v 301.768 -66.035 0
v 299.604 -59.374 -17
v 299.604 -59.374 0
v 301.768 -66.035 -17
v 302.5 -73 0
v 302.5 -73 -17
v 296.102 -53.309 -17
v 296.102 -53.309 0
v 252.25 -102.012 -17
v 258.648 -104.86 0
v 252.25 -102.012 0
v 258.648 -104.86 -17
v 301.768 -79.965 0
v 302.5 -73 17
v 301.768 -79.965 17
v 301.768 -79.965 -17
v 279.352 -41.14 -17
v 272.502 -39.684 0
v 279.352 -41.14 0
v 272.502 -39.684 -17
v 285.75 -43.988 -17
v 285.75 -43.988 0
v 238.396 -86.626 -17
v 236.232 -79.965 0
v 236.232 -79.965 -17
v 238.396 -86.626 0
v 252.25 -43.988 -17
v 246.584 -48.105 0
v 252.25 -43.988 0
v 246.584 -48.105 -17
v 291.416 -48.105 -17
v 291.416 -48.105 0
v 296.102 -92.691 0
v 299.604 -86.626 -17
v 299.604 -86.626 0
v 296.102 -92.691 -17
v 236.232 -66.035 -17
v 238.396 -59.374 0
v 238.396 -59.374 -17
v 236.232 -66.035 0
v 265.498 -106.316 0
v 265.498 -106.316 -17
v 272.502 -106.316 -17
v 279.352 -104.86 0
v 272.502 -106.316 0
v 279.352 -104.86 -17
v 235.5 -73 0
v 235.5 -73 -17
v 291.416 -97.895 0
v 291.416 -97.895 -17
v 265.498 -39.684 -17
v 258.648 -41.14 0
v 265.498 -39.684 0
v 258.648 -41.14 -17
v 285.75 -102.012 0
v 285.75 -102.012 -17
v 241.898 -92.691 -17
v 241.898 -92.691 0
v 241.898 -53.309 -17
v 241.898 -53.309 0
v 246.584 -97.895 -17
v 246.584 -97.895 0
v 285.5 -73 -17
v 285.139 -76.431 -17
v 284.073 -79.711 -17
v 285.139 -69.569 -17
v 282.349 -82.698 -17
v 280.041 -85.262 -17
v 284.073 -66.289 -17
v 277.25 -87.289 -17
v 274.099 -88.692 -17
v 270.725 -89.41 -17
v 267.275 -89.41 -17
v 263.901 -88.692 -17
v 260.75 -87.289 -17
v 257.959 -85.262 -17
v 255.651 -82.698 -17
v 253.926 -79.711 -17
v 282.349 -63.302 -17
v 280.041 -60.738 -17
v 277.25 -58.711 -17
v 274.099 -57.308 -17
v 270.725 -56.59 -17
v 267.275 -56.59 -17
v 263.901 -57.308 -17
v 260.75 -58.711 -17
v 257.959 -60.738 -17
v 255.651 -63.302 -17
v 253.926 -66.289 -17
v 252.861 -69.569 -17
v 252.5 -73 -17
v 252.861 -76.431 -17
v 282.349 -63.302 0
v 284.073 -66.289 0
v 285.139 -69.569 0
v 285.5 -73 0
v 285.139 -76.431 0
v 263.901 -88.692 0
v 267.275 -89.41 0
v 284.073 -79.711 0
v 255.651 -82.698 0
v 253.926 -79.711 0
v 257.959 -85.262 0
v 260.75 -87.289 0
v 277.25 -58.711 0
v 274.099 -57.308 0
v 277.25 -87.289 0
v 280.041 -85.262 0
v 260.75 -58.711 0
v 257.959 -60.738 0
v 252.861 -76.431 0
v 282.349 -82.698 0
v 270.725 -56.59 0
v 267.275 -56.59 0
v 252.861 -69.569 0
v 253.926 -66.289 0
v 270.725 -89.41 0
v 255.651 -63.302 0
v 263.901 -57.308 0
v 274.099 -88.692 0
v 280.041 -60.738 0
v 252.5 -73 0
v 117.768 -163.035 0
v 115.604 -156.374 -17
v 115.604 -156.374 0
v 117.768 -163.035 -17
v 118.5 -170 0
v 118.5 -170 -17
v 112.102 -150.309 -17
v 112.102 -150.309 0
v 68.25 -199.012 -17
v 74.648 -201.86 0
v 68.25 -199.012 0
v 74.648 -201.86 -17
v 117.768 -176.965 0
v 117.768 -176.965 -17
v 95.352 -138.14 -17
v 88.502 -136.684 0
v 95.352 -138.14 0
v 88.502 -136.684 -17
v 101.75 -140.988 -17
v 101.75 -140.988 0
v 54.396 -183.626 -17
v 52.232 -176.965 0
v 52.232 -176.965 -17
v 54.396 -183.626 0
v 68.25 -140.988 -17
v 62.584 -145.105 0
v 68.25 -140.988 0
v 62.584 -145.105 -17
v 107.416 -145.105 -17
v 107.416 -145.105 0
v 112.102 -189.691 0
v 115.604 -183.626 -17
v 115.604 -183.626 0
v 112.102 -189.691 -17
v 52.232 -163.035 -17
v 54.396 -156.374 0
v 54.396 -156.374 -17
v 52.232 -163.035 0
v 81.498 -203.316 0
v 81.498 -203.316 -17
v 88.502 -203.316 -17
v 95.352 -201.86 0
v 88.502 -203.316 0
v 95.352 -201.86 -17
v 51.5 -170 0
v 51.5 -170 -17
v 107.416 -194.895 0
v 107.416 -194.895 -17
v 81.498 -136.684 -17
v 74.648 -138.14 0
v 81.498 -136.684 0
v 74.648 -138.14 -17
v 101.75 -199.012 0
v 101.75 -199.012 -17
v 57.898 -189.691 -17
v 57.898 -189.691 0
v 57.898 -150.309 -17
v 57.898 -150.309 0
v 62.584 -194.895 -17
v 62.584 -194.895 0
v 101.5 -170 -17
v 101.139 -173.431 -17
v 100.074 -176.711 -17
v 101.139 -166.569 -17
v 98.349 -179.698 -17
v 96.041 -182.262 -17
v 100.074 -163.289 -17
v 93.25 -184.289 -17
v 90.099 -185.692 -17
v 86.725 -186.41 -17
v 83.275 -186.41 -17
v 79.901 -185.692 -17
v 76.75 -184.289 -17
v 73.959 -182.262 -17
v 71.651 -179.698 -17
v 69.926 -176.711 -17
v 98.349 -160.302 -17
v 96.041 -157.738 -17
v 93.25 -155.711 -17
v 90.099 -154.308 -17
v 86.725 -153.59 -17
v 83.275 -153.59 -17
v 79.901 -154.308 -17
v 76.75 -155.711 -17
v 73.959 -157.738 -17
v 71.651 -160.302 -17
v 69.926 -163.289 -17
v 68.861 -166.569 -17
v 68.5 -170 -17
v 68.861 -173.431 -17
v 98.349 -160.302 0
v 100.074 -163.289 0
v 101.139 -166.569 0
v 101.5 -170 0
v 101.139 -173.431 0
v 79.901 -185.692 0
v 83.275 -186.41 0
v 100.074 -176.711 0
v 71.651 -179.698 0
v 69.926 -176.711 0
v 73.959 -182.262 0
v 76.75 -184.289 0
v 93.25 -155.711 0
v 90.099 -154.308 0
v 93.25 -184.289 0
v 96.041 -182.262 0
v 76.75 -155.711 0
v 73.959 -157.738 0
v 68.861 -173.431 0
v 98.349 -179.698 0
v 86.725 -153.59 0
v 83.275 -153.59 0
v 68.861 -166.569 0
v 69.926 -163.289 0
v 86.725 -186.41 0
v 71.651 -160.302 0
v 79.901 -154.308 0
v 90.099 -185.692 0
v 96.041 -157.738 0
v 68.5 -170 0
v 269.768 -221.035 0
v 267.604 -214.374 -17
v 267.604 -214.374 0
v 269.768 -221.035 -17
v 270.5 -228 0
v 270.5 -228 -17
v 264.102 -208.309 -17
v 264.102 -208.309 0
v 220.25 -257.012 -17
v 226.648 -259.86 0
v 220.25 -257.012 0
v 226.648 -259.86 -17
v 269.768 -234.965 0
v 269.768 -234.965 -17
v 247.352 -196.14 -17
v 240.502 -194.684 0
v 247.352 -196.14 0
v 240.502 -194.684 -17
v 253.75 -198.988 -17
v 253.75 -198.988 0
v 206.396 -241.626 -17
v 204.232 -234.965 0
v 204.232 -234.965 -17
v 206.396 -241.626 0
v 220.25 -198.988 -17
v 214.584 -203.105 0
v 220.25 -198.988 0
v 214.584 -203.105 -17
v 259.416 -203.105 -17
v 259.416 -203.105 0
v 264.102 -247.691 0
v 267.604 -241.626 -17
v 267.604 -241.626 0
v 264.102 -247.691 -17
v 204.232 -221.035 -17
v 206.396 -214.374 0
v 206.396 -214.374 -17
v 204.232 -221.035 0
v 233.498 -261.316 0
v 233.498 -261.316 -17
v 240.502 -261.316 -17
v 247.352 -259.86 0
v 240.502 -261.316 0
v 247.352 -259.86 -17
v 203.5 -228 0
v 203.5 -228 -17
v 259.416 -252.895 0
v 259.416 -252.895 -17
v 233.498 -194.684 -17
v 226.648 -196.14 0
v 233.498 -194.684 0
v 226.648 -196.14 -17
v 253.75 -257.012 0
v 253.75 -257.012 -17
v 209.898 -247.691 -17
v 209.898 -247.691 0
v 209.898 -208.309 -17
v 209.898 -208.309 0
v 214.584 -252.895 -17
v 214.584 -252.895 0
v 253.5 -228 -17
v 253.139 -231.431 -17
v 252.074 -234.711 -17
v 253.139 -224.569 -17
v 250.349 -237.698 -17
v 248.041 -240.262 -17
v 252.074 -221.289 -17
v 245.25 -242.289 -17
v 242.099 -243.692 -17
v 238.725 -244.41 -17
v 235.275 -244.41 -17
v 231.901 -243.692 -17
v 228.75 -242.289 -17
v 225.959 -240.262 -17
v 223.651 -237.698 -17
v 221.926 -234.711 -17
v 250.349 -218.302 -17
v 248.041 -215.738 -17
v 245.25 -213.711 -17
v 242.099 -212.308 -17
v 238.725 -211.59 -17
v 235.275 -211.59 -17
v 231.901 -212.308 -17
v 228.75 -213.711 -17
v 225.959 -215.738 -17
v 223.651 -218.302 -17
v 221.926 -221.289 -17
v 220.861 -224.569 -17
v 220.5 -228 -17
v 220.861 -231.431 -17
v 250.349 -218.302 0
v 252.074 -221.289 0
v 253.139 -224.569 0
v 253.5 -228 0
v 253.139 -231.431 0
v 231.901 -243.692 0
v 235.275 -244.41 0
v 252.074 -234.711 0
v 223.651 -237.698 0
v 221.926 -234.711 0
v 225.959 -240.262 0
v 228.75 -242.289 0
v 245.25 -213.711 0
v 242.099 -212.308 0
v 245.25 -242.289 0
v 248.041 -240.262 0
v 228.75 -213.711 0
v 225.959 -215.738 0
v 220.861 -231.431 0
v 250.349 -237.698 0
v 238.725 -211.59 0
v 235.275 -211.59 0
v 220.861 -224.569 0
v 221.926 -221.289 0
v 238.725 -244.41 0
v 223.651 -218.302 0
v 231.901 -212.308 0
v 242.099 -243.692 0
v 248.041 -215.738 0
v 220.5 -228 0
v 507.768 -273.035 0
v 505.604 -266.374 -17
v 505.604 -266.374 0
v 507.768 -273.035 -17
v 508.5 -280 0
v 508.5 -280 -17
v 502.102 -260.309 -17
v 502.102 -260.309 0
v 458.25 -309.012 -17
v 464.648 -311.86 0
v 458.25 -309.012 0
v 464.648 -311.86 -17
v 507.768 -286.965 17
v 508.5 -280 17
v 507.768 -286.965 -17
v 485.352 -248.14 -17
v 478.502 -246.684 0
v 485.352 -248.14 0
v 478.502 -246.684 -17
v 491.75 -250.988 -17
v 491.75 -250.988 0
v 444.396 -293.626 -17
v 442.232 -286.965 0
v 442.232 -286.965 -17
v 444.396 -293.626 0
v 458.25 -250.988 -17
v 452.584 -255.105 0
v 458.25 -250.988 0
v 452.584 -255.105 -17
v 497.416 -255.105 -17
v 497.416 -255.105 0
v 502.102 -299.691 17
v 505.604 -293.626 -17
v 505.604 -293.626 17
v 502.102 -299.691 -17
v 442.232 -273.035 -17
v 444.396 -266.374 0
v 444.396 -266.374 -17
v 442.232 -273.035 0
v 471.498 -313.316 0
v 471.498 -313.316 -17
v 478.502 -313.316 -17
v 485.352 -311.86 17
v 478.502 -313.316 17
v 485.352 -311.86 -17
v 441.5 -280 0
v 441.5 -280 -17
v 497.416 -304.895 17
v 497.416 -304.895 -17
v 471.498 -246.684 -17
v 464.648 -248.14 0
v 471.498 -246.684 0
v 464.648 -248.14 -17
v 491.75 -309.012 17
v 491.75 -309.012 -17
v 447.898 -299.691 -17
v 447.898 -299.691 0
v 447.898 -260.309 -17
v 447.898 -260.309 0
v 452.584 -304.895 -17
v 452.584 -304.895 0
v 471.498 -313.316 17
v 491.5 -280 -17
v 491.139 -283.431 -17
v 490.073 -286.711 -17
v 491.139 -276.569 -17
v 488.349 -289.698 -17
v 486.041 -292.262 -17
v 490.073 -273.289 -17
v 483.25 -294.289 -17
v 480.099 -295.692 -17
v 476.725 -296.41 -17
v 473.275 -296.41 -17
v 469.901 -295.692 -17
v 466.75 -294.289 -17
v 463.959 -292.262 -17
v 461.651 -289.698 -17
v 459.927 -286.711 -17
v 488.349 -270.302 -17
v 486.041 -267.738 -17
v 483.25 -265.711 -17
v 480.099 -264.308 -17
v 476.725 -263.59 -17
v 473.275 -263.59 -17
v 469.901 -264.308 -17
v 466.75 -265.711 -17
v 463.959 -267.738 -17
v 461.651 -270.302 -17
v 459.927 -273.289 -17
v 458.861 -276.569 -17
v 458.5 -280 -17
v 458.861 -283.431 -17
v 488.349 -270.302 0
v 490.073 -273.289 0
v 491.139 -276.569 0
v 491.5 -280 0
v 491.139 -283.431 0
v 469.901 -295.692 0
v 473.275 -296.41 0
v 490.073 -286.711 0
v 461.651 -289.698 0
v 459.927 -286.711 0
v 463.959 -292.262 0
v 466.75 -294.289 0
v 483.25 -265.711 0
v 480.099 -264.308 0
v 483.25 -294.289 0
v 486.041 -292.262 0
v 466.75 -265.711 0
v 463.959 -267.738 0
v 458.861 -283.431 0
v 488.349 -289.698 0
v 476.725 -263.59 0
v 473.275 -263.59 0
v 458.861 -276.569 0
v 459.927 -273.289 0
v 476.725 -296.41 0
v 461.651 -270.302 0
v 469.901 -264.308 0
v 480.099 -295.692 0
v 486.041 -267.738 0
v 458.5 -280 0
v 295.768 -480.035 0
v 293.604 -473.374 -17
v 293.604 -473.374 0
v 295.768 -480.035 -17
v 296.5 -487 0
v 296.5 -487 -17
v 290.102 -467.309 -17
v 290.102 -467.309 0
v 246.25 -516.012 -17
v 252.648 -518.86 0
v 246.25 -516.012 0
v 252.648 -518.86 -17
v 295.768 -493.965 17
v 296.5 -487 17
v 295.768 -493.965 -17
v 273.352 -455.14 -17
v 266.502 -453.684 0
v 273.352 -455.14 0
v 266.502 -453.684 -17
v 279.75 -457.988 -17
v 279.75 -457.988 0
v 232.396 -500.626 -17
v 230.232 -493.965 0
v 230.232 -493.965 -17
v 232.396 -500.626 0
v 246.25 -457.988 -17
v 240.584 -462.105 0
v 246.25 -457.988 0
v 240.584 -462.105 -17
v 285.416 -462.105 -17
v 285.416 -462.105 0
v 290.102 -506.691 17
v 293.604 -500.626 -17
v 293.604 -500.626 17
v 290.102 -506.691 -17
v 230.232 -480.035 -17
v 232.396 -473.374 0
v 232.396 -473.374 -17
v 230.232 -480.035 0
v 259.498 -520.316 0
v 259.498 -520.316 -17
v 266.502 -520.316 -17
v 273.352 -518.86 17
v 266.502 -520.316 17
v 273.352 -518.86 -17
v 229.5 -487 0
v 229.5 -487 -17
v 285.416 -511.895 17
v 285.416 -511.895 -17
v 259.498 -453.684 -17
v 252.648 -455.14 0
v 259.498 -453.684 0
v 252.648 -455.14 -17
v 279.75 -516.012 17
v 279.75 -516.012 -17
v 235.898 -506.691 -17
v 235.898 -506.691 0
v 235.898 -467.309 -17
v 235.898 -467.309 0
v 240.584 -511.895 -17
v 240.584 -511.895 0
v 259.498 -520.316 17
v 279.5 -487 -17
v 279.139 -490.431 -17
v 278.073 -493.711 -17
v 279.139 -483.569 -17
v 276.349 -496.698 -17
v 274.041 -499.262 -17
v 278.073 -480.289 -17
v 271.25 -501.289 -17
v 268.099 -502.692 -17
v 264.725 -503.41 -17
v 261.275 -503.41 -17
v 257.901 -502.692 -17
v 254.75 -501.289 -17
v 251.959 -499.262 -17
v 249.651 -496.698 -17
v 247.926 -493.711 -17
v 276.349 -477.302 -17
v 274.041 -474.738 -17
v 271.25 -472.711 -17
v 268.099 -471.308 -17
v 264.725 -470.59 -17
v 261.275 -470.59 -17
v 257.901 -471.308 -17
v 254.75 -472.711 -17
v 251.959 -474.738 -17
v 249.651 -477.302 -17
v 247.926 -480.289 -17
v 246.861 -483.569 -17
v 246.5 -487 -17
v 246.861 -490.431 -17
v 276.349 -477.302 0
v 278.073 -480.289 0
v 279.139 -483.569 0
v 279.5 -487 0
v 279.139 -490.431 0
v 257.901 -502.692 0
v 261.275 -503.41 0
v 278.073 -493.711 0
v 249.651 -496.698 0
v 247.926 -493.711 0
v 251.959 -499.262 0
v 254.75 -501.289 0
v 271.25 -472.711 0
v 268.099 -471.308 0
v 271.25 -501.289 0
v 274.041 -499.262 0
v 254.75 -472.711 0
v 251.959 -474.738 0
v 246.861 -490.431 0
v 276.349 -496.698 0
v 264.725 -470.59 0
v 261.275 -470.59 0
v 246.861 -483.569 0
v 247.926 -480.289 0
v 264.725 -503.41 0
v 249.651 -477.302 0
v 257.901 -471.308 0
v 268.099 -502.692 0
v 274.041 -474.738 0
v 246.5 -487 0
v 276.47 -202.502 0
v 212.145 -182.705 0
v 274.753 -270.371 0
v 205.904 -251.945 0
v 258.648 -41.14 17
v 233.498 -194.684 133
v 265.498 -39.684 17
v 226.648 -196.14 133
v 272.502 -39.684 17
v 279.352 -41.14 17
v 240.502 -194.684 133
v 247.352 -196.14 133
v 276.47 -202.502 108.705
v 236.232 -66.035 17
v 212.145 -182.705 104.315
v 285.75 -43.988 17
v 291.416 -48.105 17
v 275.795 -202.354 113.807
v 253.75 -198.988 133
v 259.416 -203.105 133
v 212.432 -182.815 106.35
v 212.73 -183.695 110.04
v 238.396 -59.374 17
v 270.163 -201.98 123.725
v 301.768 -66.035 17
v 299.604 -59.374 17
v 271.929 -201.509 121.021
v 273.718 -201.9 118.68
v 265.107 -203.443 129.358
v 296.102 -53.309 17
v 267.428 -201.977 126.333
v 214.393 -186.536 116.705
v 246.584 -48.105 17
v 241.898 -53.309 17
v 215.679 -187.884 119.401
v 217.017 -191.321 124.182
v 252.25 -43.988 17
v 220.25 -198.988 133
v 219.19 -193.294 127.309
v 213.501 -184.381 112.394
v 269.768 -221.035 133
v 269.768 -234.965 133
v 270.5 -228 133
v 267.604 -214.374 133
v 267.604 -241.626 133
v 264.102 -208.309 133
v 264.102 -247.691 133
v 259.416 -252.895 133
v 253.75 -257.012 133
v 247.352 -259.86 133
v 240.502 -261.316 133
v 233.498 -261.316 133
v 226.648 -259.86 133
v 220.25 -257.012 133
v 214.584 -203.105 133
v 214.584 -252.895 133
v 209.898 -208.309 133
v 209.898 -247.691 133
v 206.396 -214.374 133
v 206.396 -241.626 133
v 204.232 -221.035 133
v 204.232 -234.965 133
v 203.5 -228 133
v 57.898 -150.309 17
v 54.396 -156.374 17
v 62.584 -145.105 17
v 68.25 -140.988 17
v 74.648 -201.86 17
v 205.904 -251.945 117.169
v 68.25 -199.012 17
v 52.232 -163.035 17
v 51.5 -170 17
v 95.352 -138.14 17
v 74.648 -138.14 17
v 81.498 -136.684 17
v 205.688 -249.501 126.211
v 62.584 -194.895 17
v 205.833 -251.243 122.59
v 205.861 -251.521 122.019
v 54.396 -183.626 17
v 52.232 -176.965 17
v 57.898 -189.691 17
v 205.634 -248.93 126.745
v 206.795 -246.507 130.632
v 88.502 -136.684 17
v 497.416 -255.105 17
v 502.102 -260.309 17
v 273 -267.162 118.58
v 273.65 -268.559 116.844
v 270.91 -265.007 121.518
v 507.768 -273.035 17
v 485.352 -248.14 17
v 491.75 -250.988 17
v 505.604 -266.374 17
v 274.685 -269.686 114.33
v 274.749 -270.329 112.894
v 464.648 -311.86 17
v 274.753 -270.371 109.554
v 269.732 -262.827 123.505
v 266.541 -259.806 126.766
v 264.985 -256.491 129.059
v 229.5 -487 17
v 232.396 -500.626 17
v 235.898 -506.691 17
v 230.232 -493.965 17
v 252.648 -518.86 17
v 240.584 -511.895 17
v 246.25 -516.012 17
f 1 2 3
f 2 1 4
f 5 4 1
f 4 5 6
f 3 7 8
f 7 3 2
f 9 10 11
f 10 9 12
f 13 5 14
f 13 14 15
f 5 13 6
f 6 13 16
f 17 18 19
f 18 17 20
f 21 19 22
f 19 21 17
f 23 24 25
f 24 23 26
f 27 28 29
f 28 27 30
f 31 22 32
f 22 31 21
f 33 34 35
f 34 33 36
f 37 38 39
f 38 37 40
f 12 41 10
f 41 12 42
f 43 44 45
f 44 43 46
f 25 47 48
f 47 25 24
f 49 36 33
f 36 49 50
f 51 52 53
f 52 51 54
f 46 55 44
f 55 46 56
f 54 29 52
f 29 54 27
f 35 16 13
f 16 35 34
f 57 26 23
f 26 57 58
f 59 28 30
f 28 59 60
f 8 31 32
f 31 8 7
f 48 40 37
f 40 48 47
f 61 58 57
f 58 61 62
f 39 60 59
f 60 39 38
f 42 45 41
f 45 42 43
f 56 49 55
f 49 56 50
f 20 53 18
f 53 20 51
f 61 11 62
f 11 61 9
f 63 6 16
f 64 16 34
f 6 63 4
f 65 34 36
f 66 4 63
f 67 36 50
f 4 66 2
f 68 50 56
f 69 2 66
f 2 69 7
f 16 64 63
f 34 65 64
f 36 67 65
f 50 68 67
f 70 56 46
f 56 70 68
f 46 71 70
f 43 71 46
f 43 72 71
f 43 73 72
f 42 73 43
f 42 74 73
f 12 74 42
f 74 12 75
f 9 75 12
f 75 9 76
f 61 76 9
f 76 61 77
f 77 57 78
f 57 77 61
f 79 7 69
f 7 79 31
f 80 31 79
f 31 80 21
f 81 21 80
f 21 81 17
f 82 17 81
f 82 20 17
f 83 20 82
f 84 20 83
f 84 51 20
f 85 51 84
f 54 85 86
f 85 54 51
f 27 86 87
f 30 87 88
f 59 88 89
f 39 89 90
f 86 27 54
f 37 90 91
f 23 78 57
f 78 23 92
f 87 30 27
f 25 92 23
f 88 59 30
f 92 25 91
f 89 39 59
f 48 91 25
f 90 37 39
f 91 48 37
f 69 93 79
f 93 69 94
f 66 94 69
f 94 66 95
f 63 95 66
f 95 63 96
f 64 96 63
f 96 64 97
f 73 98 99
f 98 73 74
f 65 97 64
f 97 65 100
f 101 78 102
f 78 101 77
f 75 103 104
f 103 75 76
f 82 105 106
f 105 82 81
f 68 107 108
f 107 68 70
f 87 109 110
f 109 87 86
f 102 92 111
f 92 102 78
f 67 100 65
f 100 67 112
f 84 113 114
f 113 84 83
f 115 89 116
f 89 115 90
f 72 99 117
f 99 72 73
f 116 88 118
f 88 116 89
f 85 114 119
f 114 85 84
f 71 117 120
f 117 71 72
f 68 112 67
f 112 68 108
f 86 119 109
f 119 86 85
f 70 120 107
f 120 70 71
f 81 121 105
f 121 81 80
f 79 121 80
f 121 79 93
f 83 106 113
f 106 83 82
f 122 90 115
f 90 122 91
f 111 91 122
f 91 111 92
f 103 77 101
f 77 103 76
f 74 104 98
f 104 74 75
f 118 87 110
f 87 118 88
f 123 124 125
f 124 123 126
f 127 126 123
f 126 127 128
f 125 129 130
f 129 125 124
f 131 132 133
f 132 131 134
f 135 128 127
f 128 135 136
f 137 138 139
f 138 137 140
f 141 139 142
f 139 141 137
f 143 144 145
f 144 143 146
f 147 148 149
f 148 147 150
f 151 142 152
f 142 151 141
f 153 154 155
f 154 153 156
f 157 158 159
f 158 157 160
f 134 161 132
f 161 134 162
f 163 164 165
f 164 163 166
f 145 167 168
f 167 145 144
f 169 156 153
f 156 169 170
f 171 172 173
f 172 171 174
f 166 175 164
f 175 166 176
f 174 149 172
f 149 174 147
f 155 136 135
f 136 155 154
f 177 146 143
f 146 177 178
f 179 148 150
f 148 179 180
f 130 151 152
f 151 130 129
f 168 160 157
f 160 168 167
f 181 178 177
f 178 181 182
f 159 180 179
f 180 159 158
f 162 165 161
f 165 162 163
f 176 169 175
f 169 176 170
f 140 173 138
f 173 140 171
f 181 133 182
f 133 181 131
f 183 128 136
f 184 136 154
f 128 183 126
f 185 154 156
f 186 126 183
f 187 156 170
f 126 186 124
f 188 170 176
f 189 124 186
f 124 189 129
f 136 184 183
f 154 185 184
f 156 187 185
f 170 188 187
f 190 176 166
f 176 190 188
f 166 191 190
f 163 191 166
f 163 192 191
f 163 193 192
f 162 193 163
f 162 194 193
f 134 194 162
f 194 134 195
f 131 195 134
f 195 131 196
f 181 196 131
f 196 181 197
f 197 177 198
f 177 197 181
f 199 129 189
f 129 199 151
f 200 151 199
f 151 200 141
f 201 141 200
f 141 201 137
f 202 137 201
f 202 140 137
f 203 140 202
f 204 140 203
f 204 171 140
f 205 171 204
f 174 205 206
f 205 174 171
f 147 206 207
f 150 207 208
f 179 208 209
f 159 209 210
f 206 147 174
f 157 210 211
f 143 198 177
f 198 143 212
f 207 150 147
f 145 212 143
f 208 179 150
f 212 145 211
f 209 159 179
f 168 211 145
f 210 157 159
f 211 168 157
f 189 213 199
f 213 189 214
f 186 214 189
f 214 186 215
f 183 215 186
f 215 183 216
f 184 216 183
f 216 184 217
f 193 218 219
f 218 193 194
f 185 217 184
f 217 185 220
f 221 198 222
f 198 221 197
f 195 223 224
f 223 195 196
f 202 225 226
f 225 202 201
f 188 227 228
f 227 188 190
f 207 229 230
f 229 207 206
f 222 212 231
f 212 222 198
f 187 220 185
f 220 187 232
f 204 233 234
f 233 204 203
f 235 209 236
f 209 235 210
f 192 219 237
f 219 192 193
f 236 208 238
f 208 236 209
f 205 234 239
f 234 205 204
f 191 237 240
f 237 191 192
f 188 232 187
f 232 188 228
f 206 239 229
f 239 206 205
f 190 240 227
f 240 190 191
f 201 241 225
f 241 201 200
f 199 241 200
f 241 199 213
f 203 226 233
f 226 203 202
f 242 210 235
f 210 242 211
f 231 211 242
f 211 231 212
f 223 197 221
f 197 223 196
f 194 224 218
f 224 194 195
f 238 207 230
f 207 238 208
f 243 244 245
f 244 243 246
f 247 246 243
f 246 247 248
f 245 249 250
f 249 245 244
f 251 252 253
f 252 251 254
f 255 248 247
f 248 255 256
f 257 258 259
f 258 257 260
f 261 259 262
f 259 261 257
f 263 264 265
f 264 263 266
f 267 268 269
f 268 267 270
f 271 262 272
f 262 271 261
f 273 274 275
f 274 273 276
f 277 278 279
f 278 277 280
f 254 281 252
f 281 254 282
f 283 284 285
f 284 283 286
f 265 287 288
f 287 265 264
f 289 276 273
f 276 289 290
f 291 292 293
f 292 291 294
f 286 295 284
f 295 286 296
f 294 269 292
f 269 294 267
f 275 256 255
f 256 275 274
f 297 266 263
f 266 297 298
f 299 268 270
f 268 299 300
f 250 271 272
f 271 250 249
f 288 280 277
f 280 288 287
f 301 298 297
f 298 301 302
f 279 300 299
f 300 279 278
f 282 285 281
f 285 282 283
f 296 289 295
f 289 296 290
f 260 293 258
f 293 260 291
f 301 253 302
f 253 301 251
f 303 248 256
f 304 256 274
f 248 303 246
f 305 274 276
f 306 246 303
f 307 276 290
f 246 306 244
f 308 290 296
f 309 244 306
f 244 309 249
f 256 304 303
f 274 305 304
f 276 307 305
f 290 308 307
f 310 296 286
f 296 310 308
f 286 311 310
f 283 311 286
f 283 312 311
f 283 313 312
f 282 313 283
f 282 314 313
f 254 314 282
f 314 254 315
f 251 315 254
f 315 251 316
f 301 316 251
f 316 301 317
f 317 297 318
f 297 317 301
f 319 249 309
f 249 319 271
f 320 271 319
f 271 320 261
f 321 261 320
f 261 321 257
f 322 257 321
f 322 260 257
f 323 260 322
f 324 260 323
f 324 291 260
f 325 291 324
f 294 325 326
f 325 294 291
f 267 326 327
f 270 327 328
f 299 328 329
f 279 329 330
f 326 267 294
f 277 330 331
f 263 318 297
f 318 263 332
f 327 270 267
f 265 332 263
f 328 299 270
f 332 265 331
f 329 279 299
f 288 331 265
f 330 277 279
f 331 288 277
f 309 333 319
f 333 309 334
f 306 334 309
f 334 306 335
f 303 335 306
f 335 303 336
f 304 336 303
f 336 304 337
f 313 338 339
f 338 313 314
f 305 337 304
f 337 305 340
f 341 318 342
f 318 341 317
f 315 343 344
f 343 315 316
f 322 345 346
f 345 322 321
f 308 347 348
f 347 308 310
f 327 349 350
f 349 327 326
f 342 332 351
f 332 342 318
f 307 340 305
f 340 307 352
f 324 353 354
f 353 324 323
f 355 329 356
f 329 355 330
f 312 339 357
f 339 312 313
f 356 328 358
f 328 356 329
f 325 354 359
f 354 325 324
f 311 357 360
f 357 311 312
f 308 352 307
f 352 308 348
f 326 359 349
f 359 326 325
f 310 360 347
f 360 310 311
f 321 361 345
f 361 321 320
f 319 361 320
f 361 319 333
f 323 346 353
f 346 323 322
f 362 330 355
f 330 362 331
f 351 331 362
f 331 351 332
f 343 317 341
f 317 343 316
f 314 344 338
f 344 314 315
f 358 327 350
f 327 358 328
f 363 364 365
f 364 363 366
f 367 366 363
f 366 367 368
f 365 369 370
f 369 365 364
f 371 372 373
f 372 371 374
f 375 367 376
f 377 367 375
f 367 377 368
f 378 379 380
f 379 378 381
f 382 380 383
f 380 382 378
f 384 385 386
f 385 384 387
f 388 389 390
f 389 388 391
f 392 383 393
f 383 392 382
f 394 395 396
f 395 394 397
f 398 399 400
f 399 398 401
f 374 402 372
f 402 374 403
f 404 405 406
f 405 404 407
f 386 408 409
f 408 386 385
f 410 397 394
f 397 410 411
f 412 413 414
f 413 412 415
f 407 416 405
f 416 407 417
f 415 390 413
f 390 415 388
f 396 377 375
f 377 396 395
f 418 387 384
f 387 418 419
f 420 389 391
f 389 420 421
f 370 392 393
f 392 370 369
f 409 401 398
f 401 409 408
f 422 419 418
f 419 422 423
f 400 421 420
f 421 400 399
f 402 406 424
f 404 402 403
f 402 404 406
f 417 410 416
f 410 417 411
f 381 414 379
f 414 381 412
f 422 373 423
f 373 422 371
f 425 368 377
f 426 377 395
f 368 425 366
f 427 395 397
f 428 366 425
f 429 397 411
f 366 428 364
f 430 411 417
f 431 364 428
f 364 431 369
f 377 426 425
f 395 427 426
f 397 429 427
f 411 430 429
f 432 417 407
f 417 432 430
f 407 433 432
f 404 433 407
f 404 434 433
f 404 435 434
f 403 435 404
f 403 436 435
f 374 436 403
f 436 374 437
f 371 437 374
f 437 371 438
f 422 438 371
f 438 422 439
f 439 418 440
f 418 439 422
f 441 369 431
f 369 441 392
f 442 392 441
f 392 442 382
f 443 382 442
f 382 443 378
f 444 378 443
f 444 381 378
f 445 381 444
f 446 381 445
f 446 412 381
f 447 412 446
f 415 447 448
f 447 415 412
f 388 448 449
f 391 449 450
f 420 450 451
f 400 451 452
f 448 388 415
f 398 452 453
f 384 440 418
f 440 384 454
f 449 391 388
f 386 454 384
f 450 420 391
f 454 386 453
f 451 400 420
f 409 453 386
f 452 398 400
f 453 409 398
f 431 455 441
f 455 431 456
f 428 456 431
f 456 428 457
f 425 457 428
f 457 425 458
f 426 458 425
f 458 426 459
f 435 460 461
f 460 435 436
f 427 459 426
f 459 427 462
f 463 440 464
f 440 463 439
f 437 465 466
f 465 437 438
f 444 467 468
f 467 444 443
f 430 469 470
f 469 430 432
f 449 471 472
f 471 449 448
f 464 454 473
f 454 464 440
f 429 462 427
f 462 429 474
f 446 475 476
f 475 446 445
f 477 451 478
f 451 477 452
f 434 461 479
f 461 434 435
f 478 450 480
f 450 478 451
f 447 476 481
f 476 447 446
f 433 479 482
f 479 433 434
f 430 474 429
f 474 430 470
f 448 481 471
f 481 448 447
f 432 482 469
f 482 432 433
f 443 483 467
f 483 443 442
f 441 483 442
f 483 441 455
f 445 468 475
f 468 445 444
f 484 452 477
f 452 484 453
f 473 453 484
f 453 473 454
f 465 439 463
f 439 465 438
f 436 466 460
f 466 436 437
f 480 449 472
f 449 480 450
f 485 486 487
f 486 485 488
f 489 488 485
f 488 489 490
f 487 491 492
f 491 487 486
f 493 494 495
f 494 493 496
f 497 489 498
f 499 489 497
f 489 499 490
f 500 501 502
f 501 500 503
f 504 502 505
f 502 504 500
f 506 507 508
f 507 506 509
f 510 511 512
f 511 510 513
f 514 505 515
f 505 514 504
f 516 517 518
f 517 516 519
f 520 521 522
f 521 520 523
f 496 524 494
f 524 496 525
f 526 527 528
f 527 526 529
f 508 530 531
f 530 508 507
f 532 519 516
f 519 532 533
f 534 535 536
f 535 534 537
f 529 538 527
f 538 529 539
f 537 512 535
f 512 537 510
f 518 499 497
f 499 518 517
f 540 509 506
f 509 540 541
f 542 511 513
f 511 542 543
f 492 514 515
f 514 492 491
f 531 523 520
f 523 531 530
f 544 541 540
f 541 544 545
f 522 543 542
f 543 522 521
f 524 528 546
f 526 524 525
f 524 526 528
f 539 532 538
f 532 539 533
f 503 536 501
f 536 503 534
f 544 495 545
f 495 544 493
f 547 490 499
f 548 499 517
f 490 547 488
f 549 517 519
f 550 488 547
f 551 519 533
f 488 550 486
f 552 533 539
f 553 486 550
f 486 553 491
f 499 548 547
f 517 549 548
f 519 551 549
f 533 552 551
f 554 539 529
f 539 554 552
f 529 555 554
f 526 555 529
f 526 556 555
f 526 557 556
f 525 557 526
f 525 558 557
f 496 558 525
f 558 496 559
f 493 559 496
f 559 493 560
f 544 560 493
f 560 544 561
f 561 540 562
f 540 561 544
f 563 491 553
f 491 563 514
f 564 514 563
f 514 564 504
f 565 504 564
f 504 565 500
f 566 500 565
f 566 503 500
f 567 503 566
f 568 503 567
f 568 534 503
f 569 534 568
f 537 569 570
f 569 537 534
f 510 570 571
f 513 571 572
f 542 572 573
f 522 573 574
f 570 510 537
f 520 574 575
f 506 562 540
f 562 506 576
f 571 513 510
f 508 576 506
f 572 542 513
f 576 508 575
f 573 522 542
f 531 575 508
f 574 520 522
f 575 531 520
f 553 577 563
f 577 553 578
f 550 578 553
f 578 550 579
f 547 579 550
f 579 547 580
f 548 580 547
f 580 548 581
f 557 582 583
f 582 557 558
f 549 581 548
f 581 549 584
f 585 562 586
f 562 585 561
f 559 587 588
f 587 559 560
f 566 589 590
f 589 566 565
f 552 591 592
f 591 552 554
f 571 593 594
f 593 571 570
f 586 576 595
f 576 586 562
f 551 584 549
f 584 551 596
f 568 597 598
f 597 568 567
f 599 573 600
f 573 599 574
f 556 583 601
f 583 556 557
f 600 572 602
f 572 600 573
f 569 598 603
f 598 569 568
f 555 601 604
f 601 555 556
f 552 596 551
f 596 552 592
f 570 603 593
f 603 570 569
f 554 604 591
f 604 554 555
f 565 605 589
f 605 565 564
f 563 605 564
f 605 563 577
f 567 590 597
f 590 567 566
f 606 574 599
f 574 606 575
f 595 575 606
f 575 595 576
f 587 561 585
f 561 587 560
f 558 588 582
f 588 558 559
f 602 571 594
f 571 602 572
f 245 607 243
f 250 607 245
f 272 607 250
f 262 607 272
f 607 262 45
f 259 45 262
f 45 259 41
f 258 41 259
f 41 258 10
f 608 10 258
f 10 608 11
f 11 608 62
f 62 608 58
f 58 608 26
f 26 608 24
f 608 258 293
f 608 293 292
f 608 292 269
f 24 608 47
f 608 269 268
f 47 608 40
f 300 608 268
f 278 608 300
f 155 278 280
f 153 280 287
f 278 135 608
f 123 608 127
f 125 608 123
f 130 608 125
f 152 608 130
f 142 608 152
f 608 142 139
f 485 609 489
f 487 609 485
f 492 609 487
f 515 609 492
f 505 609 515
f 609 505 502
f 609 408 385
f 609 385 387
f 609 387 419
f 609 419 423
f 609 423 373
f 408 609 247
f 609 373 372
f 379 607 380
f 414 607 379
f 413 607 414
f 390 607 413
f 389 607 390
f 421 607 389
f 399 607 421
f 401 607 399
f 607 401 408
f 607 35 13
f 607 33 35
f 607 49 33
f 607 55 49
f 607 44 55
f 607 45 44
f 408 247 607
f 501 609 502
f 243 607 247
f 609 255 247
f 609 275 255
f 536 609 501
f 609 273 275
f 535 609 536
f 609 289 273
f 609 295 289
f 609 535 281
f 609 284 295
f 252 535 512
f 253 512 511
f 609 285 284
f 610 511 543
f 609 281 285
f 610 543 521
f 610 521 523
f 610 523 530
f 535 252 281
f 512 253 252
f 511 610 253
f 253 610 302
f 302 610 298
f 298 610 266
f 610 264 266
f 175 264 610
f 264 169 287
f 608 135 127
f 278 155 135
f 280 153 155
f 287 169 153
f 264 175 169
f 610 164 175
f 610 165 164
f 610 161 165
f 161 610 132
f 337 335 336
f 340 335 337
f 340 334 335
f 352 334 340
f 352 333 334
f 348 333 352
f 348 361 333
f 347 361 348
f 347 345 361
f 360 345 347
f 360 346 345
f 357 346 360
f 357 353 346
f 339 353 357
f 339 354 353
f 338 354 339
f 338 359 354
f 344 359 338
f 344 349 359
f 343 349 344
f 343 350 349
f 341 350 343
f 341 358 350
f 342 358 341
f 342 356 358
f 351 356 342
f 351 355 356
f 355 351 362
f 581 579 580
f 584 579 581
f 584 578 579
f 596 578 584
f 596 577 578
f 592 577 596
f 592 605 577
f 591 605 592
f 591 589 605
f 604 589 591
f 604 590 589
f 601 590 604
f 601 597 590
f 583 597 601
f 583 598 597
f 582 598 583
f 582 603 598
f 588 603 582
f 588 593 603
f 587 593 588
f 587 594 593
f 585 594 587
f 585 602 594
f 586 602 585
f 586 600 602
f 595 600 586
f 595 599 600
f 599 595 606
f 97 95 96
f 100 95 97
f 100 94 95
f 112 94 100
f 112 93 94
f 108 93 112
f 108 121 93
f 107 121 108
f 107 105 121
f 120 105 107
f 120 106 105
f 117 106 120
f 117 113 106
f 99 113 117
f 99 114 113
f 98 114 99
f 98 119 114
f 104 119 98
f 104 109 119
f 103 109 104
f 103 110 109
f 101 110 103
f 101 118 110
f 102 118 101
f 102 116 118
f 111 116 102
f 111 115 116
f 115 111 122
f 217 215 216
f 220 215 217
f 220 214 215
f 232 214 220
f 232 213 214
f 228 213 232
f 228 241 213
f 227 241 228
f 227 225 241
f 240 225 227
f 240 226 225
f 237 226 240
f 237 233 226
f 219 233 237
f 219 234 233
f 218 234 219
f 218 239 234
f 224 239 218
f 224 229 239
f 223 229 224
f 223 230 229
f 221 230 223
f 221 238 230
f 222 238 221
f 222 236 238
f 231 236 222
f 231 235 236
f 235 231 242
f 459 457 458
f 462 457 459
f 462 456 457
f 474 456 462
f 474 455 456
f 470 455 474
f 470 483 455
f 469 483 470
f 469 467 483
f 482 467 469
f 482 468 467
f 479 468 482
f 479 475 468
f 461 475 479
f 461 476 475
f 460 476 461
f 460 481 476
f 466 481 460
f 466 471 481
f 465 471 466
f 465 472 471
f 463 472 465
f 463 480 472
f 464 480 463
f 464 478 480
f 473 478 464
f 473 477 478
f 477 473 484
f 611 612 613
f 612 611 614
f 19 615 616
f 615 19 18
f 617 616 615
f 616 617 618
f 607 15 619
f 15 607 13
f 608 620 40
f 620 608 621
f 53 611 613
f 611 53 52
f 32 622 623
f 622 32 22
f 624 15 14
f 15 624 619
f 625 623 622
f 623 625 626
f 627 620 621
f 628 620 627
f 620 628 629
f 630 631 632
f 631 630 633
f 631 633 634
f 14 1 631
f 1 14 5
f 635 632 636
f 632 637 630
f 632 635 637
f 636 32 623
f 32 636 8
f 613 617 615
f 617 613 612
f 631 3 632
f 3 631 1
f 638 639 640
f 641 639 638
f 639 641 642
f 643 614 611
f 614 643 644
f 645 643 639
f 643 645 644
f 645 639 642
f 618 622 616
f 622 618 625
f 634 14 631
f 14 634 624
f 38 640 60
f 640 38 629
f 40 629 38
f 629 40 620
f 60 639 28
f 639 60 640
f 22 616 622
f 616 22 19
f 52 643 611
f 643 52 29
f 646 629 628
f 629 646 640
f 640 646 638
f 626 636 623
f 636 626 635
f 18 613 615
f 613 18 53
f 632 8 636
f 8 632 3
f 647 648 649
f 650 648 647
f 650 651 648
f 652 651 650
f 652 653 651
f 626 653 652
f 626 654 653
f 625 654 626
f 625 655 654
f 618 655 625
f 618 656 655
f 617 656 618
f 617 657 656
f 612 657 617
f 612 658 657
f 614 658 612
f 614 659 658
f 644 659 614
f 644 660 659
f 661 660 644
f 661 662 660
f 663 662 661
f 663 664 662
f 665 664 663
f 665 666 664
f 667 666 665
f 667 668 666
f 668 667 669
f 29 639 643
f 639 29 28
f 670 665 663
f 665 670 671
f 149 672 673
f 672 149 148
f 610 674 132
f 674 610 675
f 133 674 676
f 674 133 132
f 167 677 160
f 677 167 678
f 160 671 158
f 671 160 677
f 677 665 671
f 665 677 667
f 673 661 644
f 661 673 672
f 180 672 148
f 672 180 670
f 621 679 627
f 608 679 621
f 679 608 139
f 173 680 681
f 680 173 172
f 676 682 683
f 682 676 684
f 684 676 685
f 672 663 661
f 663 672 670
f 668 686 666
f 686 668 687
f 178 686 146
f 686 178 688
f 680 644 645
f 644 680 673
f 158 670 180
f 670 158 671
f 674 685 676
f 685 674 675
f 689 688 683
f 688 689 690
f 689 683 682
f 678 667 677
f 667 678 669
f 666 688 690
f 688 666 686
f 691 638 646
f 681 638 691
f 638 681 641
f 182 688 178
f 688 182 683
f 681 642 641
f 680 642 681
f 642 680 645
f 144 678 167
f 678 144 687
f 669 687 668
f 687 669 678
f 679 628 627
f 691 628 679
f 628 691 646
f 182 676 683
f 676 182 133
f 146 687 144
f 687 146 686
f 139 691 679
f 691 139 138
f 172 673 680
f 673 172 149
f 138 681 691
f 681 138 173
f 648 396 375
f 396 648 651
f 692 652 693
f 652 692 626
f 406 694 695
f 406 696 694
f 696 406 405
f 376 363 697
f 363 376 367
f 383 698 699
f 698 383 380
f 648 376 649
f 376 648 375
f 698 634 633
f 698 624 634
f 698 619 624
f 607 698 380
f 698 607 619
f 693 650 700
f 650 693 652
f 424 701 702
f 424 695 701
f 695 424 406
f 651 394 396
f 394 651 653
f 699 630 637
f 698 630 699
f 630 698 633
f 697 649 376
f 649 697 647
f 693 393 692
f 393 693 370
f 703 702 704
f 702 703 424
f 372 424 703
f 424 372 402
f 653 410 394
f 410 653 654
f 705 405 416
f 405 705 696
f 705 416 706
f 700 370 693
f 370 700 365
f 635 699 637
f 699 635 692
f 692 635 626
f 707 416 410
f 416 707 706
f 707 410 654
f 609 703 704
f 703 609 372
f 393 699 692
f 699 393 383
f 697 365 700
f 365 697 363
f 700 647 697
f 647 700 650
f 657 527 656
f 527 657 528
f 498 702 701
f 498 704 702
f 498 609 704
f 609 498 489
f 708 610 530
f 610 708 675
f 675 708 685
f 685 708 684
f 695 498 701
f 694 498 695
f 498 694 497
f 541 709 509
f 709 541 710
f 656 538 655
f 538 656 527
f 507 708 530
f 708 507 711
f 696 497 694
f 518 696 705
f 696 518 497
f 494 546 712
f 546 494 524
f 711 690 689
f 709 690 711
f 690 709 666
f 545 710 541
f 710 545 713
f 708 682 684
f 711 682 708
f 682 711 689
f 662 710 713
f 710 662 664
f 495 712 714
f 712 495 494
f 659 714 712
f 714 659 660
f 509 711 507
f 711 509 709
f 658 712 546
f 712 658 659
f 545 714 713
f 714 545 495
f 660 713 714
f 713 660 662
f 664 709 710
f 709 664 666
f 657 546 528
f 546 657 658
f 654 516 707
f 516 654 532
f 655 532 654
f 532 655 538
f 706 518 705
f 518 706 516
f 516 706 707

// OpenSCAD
    clearance=17; // [50]
    height=150; // [300]
    r1=25-17/2; r2=25+17/2;
    for(xy = [[269,73],[85,170],[237,228],[475,280],[263,487]]){
        translate([xy[0],-xy[1],0]) difference(){
            cylinder(r=r2, h=clearance*2, center=true);
            cylinder(r=r1, h=clearance*2+.1, center=true);
        }
        hull(){
            translate([xy[0],-xy[1],0]) cylinder(r=r2, h=clearance);
            translate([237,-228,0])
            cylinder(r=r2, h=height-clearance);
        }
    }
